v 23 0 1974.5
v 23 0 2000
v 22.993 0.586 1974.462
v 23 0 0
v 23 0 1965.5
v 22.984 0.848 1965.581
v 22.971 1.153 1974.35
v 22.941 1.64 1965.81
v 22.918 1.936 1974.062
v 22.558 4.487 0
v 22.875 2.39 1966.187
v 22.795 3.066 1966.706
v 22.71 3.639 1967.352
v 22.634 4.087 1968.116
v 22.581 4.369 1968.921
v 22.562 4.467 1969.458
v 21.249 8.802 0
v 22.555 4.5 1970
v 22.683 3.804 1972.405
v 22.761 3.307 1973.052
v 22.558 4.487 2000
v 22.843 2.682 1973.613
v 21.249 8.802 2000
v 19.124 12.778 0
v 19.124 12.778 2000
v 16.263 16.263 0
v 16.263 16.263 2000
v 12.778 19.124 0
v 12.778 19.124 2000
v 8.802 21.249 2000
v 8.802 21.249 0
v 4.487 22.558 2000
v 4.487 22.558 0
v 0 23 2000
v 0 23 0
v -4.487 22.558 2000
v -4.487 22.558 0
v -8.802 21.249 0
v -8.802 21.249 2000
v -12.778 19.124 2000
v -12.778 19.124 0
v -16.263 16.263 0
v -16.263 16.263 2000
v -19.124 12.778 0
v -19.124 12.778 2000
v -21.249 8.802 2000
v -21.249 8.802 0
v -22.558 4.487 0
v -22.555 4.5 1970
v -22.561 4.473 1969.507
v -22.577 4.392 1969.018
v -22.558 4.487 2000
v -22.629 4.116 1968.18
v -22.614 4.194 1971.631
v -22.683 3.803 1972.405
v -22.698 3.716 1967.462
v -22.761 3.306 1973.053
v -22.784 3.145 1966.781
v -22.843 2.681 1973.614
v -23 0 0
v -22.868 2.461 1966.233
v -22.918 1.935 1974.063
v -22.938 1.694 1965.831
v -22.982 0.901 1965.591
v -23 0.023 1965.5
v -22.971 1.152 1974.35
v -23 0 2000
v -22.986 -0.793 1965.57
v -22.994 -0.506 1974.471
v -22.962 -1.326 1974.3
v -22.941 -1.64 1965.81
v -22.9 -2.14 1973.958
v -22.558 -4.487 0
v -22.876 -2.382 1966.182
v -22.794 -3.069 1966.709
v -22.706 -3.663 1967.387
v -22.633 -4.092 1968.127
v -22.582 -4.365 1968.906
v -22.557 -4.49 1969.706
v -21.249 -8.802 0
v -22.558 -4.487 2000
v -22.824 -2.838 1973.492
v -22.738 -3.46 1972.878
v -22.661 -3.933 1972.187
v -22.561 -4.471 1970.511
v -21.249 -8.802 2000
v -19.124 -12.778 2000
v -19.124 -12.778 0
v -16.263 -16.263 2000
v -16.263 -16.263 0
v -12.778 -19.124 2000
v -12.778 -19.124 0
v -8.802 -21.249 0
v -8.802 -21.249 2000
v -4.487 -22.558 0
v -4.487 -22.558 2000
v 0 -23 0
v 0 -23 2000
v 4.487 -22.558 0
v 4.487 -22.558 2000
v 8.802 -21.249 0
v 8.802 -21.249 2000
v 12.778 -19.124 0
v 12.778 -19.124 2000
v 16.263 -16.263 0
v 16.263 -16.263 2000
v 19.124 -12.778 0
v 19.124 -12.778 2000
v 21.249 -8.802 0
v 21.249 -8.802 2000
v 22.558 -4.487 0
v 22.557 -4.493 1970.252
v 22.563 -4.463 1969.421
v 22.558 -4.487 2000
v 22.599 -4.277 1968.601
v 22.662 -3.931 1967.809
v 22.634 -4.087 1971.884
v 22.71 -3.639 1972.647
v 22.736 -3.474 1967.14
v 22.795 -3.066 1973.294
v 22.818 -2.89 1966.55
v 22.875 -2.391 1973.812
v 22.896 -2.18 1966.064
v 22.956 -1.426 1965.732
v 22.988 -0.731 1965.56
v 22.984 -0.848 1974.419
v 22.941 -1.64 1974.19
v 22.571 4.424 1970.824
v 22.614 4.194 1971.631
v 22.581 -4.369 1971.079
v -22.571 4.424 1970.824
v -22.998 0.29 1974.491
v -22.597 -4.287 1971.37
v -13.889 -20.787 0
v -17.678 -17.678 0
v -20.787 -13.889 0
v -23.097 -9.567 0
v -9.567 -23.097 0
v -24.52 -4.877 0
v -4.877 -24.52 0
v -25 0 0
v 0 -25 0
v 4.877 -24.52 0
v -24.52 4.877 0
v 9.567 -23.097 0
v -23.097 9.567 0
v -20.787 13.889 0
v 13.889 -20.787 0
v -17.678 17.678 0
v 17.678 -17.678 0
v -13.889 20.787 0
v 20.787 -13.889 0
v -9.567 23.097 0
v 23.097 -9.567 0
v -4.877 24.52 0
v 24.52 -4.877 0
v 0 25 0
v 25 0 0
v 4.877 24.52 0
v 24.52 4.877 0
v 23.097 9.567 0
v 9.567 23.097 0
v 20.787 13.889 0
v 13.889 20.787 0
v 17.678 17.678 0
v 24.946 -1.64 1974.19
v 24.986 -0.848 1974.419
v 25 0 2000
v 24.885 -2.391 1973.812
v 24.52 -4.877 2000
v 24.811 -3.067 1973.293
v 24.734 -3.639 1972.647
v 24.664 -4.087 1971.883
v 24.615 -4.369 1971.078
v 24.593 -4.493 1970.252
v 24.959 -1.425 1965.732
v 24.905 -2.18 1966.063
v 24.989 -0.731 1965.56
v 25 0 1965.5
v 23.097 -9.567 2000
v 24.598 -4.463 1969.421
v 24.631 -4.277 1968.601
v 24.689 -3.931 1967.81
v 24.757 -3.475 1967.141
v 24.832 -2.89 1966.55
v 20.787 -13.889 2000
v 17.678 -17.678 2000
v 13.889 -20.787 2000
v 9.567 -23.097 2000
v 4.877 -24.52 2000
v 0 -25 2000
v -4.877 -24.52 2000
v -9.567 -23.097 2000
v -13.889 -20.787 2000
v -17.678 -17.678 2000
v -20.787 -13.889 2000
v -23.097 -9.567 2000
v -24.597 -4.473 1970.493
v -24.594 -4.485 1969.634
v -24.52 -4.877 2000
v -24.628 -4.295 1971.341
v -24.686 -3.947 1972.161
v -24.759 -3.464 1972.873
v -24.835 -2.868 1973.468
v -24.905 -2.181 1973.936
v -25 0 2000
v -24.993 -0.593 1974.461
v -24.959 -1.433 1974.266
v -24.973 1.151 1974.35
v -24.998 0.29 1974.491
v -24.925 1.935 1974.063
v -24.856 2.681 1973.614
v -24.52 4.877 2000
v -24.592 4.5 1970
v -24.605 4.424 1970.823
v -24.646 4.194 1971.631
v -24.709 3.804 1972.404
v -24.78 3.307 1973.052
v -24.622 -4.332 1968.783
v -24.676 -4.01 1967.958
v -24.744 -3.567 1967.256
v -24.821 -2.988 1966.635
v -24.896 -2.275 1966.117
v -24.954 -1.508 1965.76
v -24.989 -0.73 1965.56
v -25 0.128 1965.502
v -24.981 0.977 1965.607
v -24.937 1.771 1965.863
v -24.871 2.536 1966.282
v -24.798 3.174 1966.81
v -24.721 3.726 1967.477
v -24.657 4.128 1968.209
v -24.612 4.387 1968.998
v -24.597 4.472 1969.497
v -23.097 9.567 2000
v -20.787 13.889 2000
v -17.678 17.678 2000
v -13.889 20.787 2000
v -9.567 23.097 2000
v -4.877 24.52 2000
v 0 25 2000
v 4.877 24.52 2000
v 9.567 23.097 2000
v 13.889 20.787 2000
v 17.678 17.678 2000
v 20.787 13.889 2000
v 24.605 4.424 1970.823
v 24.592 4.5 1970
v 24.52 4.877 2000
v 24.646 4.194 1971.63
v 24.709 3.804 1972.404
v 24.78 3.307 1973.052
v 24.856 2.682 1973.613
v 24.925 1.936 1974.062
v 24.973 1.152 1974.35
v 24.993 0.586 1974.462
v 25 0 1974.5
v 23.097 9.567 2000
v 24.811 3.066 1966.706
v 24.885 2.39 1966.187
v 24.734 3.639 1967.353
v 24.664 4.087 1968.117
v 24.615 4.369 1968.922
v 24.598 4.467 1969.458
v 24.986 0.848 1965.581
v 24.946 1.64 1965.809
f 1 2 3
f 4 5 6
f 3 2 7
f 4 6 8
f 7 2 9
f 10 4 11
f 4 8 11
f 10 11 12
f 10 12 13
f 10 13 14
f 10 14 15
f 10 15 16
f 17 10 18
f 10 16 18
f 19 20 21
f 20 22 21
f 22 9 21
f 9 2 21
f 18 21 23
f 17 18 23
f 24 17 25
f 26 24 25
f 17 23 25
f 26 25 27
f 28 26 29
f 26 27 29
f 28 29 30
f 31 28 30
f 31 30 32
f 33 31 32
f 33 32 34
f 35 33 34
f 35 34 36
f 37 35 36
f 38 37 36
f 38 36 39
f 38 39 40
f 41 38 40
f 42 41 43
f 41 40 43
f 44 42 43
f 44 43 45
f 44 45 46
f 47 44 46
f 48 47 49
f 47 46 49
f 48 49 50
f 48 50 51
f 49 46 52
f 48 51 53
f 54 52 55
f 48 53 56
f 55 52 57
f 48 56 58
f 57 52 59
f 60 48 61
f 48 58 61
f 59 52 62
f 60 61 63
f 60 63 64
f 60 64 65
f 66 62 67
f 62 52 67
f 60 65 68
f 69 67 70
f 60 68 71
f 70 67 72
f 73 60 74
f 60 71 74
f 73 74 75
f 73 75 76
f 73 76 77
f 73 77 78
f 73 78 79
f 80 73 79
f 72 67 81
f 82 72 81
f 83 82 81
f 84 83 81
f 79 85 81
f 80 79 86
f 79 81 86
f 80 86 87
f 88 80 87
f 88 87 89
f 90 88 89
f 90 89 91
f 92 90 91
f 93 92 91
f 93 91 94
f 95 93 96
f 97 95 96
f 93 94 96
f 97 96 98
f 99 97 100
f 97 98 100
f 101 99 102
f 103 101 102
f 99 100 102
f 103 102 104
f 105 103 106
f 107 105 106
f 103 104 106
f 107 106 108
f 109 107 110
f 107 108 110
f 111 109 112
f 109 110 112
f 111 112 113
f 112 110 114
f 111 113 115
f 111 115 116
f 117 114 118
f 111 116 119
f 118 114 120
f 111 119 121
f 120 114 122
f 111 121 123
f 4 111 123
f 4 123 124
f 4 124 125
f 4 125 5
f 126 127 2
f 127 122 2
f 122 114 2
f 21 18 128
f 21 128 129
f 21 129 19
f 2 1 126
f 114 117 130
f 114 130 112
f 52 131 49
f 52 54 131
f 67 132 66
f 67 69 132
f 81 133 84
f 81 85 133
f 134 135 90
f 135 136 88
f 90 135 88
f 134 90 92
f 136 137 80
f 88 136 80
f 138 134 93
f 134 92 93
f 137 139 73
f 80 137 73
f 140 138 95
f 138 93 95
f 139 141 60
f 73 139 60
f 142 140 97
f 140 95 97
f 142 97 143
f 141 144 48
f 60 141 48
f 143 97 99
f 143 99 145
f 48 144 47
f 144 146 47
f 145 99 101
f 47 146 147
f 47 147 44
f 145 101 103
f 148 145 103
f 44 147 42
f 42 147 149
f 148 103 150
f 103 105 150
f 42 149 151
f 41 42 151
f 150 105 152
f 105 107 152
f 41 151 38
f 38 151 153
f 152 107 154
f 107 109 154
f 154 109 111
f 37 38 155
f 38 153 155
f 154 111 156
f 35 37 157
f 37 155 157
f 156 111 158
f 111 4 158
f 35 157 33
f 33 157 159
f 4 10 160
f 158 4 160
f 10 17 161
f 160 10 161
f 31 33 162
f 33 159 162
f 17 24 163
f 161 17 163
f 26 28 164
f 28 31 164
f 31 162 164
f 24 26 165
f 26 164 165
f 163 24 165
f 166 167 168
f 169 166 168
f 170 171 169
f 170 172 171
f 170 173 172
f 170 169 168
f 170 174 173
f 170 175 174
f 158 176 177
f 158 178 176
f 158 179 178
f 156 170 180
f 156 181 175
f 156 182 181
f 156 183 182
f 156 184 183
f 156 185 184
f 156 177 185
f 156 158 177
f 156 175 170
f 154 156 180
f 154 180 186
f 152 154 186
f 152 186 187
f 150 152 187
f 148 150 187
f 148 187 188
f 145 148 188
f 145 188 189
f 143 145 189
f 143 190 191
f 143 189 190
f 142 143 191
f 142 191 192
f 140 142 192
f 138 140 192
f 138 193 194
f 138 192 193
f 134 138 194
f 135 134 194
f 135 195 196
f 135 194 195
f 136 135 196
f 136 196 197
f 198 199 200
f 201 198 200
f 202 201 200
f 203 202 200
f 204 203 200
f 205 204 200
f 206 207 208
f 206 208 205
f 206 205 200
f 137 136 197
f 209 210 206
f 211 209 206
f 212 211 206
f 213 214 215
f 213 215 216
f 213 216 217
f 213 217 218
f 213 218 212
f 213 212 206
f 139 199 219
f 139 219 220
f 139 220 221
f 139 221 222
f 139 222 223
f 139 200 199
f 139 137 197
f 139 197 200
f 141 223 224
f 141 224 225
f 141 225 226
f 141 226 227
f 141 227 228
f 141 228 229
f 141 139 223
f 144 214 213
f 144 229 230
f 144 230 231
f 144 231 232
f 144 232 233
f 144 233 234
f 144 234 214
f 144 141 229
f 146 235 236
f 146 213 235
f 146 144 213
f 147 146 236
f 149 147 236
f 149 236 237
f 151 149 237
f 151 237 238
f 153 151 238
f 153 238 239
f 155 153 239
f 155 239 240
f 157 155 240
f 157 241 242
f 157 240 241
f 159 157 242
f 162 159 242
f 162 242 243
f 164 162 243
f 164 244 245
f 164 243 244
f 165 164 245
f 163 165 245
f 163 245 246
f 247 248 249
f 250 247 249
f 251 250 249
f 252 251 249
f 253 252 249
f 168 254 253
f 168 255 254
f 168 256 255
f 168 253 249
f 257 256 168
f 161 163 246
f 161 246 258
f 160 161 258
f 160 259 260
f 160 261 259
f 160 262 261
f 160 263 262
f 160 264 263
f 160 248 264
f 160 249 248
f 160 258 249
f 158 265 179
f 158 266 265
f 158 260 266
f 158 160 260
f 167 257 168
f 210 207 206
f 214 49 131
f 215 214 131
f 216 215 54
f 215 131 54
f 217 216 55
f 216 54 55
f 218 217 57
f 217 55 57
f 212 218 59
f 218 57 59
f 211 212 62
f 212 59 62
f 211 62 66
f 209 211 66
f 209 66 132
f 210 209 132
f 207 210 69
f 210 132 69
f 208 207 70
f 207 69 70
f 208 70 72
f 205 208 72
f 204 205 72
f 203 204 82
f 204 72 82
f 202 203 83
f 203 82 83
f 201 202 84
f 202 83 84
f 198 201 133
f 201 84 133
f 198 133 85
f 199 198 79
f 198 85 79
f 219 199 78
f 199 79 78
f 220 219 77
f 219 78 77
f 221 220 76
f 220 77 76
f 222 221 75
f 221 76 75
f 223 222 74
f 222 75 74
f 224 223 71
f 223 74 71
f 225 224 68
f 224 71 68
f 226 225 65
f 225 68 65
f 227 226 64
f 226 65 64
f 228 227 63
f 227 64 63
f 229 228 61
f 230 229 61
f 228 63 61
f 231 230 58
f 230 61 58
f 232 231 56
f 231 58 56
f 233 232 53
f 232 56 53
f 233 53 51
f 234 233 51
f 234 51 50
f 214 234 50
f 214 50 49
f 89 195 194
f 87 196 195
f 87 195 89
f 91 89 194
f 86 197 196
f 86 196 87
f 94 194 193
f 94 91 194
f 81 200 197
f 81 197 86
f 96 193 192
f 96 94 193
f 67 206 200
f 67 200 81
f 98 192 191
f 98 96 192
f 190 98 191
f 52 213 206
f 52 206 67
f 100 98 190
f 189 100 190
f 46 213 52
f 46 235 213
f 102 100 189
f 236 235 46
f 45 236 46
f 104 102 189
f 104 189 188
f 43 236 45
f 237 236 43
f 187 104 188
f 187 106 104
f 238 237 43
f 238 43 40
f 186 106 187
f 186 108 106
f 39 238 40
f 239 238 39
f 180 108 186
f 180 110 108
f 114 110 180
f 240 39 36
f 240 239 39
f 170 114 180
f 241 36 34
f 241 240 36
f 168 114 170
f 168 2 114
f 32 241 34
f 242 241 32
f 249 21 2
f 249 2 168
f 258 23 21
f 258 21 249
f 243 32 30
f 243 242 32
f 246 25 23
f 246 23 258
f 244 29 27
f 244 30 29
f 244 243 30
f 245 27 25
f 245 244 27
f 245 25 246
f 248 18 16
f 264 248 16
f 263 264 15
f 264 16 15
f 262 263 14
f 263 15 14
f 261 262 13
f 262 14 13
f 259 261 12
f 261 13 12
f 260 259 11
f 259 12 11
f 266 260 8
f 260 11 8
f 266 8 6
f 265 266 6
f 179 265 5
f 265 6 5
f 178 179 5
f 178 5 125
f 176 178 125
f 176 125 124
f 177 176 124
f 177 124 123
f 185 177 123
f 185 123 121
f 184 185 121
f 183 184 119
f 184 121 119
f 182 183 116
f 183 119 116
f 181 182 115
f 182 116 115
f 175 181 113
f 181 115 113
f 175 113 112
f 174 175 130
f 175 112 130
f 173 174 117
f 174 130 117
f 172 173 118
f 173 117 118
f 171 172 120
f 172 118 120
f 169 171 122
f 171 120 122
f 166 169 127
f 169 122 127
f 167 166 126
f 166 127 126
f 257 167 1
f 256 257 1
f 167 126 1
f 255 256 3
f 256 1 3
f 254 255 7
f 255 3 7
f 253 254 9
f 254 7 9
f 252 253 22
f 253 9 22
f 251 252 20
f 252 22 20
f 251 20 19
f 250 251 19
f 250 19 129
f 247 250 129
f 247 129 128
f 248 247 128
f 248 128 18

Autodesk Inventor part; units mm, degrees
ref_plane "YZ Plane" through (0, 0, 0) normal (1, 0, 0) x (0, 1, 0)
ref_plane "XZ Plane" through (0, 0, 0) normal (0, 1, 0) x (-1, 0, 0)
ref_plane "XY Plane" through (0, 0, 0) normal (0, 0, 1) x (1, 0, 0)
sketch "Sketch1" plane through (0, 0, 0) normal (0, 0, 1) x (1, 0, 0)
  circle A0 centre (0, 0) radius 25
  dimension "d0" = 50
extrude "Extrusion1" add sketch "Sketch1" along normal blind 2000
sketch "Sketch2" plane through (0, 0, 2000) normal (0, 0, 1) x (1, 0, 0)
  circle A0 centre (0, 0) radius 23
  dimension "d3" = 46
extrude "Extrusion2" cut sketch "Sketch2" against normal blind 2000
sketch "Sketch3" plane through (0, 0, 0) normal (1, 0, 0) x (0, 1, 0)
  circle A0 centre (0, 1970) radius 4.5
  line L0 (25, 2000) -> (-25, 2000) projected
  point P0 (0, 0)
  dimension "d6" = 9
  dimension "d7" = 30
extrude "Extrusion3" cut sketch "Sketch3" along normal through all both and the other way through all
properties part number "Odnogi"
